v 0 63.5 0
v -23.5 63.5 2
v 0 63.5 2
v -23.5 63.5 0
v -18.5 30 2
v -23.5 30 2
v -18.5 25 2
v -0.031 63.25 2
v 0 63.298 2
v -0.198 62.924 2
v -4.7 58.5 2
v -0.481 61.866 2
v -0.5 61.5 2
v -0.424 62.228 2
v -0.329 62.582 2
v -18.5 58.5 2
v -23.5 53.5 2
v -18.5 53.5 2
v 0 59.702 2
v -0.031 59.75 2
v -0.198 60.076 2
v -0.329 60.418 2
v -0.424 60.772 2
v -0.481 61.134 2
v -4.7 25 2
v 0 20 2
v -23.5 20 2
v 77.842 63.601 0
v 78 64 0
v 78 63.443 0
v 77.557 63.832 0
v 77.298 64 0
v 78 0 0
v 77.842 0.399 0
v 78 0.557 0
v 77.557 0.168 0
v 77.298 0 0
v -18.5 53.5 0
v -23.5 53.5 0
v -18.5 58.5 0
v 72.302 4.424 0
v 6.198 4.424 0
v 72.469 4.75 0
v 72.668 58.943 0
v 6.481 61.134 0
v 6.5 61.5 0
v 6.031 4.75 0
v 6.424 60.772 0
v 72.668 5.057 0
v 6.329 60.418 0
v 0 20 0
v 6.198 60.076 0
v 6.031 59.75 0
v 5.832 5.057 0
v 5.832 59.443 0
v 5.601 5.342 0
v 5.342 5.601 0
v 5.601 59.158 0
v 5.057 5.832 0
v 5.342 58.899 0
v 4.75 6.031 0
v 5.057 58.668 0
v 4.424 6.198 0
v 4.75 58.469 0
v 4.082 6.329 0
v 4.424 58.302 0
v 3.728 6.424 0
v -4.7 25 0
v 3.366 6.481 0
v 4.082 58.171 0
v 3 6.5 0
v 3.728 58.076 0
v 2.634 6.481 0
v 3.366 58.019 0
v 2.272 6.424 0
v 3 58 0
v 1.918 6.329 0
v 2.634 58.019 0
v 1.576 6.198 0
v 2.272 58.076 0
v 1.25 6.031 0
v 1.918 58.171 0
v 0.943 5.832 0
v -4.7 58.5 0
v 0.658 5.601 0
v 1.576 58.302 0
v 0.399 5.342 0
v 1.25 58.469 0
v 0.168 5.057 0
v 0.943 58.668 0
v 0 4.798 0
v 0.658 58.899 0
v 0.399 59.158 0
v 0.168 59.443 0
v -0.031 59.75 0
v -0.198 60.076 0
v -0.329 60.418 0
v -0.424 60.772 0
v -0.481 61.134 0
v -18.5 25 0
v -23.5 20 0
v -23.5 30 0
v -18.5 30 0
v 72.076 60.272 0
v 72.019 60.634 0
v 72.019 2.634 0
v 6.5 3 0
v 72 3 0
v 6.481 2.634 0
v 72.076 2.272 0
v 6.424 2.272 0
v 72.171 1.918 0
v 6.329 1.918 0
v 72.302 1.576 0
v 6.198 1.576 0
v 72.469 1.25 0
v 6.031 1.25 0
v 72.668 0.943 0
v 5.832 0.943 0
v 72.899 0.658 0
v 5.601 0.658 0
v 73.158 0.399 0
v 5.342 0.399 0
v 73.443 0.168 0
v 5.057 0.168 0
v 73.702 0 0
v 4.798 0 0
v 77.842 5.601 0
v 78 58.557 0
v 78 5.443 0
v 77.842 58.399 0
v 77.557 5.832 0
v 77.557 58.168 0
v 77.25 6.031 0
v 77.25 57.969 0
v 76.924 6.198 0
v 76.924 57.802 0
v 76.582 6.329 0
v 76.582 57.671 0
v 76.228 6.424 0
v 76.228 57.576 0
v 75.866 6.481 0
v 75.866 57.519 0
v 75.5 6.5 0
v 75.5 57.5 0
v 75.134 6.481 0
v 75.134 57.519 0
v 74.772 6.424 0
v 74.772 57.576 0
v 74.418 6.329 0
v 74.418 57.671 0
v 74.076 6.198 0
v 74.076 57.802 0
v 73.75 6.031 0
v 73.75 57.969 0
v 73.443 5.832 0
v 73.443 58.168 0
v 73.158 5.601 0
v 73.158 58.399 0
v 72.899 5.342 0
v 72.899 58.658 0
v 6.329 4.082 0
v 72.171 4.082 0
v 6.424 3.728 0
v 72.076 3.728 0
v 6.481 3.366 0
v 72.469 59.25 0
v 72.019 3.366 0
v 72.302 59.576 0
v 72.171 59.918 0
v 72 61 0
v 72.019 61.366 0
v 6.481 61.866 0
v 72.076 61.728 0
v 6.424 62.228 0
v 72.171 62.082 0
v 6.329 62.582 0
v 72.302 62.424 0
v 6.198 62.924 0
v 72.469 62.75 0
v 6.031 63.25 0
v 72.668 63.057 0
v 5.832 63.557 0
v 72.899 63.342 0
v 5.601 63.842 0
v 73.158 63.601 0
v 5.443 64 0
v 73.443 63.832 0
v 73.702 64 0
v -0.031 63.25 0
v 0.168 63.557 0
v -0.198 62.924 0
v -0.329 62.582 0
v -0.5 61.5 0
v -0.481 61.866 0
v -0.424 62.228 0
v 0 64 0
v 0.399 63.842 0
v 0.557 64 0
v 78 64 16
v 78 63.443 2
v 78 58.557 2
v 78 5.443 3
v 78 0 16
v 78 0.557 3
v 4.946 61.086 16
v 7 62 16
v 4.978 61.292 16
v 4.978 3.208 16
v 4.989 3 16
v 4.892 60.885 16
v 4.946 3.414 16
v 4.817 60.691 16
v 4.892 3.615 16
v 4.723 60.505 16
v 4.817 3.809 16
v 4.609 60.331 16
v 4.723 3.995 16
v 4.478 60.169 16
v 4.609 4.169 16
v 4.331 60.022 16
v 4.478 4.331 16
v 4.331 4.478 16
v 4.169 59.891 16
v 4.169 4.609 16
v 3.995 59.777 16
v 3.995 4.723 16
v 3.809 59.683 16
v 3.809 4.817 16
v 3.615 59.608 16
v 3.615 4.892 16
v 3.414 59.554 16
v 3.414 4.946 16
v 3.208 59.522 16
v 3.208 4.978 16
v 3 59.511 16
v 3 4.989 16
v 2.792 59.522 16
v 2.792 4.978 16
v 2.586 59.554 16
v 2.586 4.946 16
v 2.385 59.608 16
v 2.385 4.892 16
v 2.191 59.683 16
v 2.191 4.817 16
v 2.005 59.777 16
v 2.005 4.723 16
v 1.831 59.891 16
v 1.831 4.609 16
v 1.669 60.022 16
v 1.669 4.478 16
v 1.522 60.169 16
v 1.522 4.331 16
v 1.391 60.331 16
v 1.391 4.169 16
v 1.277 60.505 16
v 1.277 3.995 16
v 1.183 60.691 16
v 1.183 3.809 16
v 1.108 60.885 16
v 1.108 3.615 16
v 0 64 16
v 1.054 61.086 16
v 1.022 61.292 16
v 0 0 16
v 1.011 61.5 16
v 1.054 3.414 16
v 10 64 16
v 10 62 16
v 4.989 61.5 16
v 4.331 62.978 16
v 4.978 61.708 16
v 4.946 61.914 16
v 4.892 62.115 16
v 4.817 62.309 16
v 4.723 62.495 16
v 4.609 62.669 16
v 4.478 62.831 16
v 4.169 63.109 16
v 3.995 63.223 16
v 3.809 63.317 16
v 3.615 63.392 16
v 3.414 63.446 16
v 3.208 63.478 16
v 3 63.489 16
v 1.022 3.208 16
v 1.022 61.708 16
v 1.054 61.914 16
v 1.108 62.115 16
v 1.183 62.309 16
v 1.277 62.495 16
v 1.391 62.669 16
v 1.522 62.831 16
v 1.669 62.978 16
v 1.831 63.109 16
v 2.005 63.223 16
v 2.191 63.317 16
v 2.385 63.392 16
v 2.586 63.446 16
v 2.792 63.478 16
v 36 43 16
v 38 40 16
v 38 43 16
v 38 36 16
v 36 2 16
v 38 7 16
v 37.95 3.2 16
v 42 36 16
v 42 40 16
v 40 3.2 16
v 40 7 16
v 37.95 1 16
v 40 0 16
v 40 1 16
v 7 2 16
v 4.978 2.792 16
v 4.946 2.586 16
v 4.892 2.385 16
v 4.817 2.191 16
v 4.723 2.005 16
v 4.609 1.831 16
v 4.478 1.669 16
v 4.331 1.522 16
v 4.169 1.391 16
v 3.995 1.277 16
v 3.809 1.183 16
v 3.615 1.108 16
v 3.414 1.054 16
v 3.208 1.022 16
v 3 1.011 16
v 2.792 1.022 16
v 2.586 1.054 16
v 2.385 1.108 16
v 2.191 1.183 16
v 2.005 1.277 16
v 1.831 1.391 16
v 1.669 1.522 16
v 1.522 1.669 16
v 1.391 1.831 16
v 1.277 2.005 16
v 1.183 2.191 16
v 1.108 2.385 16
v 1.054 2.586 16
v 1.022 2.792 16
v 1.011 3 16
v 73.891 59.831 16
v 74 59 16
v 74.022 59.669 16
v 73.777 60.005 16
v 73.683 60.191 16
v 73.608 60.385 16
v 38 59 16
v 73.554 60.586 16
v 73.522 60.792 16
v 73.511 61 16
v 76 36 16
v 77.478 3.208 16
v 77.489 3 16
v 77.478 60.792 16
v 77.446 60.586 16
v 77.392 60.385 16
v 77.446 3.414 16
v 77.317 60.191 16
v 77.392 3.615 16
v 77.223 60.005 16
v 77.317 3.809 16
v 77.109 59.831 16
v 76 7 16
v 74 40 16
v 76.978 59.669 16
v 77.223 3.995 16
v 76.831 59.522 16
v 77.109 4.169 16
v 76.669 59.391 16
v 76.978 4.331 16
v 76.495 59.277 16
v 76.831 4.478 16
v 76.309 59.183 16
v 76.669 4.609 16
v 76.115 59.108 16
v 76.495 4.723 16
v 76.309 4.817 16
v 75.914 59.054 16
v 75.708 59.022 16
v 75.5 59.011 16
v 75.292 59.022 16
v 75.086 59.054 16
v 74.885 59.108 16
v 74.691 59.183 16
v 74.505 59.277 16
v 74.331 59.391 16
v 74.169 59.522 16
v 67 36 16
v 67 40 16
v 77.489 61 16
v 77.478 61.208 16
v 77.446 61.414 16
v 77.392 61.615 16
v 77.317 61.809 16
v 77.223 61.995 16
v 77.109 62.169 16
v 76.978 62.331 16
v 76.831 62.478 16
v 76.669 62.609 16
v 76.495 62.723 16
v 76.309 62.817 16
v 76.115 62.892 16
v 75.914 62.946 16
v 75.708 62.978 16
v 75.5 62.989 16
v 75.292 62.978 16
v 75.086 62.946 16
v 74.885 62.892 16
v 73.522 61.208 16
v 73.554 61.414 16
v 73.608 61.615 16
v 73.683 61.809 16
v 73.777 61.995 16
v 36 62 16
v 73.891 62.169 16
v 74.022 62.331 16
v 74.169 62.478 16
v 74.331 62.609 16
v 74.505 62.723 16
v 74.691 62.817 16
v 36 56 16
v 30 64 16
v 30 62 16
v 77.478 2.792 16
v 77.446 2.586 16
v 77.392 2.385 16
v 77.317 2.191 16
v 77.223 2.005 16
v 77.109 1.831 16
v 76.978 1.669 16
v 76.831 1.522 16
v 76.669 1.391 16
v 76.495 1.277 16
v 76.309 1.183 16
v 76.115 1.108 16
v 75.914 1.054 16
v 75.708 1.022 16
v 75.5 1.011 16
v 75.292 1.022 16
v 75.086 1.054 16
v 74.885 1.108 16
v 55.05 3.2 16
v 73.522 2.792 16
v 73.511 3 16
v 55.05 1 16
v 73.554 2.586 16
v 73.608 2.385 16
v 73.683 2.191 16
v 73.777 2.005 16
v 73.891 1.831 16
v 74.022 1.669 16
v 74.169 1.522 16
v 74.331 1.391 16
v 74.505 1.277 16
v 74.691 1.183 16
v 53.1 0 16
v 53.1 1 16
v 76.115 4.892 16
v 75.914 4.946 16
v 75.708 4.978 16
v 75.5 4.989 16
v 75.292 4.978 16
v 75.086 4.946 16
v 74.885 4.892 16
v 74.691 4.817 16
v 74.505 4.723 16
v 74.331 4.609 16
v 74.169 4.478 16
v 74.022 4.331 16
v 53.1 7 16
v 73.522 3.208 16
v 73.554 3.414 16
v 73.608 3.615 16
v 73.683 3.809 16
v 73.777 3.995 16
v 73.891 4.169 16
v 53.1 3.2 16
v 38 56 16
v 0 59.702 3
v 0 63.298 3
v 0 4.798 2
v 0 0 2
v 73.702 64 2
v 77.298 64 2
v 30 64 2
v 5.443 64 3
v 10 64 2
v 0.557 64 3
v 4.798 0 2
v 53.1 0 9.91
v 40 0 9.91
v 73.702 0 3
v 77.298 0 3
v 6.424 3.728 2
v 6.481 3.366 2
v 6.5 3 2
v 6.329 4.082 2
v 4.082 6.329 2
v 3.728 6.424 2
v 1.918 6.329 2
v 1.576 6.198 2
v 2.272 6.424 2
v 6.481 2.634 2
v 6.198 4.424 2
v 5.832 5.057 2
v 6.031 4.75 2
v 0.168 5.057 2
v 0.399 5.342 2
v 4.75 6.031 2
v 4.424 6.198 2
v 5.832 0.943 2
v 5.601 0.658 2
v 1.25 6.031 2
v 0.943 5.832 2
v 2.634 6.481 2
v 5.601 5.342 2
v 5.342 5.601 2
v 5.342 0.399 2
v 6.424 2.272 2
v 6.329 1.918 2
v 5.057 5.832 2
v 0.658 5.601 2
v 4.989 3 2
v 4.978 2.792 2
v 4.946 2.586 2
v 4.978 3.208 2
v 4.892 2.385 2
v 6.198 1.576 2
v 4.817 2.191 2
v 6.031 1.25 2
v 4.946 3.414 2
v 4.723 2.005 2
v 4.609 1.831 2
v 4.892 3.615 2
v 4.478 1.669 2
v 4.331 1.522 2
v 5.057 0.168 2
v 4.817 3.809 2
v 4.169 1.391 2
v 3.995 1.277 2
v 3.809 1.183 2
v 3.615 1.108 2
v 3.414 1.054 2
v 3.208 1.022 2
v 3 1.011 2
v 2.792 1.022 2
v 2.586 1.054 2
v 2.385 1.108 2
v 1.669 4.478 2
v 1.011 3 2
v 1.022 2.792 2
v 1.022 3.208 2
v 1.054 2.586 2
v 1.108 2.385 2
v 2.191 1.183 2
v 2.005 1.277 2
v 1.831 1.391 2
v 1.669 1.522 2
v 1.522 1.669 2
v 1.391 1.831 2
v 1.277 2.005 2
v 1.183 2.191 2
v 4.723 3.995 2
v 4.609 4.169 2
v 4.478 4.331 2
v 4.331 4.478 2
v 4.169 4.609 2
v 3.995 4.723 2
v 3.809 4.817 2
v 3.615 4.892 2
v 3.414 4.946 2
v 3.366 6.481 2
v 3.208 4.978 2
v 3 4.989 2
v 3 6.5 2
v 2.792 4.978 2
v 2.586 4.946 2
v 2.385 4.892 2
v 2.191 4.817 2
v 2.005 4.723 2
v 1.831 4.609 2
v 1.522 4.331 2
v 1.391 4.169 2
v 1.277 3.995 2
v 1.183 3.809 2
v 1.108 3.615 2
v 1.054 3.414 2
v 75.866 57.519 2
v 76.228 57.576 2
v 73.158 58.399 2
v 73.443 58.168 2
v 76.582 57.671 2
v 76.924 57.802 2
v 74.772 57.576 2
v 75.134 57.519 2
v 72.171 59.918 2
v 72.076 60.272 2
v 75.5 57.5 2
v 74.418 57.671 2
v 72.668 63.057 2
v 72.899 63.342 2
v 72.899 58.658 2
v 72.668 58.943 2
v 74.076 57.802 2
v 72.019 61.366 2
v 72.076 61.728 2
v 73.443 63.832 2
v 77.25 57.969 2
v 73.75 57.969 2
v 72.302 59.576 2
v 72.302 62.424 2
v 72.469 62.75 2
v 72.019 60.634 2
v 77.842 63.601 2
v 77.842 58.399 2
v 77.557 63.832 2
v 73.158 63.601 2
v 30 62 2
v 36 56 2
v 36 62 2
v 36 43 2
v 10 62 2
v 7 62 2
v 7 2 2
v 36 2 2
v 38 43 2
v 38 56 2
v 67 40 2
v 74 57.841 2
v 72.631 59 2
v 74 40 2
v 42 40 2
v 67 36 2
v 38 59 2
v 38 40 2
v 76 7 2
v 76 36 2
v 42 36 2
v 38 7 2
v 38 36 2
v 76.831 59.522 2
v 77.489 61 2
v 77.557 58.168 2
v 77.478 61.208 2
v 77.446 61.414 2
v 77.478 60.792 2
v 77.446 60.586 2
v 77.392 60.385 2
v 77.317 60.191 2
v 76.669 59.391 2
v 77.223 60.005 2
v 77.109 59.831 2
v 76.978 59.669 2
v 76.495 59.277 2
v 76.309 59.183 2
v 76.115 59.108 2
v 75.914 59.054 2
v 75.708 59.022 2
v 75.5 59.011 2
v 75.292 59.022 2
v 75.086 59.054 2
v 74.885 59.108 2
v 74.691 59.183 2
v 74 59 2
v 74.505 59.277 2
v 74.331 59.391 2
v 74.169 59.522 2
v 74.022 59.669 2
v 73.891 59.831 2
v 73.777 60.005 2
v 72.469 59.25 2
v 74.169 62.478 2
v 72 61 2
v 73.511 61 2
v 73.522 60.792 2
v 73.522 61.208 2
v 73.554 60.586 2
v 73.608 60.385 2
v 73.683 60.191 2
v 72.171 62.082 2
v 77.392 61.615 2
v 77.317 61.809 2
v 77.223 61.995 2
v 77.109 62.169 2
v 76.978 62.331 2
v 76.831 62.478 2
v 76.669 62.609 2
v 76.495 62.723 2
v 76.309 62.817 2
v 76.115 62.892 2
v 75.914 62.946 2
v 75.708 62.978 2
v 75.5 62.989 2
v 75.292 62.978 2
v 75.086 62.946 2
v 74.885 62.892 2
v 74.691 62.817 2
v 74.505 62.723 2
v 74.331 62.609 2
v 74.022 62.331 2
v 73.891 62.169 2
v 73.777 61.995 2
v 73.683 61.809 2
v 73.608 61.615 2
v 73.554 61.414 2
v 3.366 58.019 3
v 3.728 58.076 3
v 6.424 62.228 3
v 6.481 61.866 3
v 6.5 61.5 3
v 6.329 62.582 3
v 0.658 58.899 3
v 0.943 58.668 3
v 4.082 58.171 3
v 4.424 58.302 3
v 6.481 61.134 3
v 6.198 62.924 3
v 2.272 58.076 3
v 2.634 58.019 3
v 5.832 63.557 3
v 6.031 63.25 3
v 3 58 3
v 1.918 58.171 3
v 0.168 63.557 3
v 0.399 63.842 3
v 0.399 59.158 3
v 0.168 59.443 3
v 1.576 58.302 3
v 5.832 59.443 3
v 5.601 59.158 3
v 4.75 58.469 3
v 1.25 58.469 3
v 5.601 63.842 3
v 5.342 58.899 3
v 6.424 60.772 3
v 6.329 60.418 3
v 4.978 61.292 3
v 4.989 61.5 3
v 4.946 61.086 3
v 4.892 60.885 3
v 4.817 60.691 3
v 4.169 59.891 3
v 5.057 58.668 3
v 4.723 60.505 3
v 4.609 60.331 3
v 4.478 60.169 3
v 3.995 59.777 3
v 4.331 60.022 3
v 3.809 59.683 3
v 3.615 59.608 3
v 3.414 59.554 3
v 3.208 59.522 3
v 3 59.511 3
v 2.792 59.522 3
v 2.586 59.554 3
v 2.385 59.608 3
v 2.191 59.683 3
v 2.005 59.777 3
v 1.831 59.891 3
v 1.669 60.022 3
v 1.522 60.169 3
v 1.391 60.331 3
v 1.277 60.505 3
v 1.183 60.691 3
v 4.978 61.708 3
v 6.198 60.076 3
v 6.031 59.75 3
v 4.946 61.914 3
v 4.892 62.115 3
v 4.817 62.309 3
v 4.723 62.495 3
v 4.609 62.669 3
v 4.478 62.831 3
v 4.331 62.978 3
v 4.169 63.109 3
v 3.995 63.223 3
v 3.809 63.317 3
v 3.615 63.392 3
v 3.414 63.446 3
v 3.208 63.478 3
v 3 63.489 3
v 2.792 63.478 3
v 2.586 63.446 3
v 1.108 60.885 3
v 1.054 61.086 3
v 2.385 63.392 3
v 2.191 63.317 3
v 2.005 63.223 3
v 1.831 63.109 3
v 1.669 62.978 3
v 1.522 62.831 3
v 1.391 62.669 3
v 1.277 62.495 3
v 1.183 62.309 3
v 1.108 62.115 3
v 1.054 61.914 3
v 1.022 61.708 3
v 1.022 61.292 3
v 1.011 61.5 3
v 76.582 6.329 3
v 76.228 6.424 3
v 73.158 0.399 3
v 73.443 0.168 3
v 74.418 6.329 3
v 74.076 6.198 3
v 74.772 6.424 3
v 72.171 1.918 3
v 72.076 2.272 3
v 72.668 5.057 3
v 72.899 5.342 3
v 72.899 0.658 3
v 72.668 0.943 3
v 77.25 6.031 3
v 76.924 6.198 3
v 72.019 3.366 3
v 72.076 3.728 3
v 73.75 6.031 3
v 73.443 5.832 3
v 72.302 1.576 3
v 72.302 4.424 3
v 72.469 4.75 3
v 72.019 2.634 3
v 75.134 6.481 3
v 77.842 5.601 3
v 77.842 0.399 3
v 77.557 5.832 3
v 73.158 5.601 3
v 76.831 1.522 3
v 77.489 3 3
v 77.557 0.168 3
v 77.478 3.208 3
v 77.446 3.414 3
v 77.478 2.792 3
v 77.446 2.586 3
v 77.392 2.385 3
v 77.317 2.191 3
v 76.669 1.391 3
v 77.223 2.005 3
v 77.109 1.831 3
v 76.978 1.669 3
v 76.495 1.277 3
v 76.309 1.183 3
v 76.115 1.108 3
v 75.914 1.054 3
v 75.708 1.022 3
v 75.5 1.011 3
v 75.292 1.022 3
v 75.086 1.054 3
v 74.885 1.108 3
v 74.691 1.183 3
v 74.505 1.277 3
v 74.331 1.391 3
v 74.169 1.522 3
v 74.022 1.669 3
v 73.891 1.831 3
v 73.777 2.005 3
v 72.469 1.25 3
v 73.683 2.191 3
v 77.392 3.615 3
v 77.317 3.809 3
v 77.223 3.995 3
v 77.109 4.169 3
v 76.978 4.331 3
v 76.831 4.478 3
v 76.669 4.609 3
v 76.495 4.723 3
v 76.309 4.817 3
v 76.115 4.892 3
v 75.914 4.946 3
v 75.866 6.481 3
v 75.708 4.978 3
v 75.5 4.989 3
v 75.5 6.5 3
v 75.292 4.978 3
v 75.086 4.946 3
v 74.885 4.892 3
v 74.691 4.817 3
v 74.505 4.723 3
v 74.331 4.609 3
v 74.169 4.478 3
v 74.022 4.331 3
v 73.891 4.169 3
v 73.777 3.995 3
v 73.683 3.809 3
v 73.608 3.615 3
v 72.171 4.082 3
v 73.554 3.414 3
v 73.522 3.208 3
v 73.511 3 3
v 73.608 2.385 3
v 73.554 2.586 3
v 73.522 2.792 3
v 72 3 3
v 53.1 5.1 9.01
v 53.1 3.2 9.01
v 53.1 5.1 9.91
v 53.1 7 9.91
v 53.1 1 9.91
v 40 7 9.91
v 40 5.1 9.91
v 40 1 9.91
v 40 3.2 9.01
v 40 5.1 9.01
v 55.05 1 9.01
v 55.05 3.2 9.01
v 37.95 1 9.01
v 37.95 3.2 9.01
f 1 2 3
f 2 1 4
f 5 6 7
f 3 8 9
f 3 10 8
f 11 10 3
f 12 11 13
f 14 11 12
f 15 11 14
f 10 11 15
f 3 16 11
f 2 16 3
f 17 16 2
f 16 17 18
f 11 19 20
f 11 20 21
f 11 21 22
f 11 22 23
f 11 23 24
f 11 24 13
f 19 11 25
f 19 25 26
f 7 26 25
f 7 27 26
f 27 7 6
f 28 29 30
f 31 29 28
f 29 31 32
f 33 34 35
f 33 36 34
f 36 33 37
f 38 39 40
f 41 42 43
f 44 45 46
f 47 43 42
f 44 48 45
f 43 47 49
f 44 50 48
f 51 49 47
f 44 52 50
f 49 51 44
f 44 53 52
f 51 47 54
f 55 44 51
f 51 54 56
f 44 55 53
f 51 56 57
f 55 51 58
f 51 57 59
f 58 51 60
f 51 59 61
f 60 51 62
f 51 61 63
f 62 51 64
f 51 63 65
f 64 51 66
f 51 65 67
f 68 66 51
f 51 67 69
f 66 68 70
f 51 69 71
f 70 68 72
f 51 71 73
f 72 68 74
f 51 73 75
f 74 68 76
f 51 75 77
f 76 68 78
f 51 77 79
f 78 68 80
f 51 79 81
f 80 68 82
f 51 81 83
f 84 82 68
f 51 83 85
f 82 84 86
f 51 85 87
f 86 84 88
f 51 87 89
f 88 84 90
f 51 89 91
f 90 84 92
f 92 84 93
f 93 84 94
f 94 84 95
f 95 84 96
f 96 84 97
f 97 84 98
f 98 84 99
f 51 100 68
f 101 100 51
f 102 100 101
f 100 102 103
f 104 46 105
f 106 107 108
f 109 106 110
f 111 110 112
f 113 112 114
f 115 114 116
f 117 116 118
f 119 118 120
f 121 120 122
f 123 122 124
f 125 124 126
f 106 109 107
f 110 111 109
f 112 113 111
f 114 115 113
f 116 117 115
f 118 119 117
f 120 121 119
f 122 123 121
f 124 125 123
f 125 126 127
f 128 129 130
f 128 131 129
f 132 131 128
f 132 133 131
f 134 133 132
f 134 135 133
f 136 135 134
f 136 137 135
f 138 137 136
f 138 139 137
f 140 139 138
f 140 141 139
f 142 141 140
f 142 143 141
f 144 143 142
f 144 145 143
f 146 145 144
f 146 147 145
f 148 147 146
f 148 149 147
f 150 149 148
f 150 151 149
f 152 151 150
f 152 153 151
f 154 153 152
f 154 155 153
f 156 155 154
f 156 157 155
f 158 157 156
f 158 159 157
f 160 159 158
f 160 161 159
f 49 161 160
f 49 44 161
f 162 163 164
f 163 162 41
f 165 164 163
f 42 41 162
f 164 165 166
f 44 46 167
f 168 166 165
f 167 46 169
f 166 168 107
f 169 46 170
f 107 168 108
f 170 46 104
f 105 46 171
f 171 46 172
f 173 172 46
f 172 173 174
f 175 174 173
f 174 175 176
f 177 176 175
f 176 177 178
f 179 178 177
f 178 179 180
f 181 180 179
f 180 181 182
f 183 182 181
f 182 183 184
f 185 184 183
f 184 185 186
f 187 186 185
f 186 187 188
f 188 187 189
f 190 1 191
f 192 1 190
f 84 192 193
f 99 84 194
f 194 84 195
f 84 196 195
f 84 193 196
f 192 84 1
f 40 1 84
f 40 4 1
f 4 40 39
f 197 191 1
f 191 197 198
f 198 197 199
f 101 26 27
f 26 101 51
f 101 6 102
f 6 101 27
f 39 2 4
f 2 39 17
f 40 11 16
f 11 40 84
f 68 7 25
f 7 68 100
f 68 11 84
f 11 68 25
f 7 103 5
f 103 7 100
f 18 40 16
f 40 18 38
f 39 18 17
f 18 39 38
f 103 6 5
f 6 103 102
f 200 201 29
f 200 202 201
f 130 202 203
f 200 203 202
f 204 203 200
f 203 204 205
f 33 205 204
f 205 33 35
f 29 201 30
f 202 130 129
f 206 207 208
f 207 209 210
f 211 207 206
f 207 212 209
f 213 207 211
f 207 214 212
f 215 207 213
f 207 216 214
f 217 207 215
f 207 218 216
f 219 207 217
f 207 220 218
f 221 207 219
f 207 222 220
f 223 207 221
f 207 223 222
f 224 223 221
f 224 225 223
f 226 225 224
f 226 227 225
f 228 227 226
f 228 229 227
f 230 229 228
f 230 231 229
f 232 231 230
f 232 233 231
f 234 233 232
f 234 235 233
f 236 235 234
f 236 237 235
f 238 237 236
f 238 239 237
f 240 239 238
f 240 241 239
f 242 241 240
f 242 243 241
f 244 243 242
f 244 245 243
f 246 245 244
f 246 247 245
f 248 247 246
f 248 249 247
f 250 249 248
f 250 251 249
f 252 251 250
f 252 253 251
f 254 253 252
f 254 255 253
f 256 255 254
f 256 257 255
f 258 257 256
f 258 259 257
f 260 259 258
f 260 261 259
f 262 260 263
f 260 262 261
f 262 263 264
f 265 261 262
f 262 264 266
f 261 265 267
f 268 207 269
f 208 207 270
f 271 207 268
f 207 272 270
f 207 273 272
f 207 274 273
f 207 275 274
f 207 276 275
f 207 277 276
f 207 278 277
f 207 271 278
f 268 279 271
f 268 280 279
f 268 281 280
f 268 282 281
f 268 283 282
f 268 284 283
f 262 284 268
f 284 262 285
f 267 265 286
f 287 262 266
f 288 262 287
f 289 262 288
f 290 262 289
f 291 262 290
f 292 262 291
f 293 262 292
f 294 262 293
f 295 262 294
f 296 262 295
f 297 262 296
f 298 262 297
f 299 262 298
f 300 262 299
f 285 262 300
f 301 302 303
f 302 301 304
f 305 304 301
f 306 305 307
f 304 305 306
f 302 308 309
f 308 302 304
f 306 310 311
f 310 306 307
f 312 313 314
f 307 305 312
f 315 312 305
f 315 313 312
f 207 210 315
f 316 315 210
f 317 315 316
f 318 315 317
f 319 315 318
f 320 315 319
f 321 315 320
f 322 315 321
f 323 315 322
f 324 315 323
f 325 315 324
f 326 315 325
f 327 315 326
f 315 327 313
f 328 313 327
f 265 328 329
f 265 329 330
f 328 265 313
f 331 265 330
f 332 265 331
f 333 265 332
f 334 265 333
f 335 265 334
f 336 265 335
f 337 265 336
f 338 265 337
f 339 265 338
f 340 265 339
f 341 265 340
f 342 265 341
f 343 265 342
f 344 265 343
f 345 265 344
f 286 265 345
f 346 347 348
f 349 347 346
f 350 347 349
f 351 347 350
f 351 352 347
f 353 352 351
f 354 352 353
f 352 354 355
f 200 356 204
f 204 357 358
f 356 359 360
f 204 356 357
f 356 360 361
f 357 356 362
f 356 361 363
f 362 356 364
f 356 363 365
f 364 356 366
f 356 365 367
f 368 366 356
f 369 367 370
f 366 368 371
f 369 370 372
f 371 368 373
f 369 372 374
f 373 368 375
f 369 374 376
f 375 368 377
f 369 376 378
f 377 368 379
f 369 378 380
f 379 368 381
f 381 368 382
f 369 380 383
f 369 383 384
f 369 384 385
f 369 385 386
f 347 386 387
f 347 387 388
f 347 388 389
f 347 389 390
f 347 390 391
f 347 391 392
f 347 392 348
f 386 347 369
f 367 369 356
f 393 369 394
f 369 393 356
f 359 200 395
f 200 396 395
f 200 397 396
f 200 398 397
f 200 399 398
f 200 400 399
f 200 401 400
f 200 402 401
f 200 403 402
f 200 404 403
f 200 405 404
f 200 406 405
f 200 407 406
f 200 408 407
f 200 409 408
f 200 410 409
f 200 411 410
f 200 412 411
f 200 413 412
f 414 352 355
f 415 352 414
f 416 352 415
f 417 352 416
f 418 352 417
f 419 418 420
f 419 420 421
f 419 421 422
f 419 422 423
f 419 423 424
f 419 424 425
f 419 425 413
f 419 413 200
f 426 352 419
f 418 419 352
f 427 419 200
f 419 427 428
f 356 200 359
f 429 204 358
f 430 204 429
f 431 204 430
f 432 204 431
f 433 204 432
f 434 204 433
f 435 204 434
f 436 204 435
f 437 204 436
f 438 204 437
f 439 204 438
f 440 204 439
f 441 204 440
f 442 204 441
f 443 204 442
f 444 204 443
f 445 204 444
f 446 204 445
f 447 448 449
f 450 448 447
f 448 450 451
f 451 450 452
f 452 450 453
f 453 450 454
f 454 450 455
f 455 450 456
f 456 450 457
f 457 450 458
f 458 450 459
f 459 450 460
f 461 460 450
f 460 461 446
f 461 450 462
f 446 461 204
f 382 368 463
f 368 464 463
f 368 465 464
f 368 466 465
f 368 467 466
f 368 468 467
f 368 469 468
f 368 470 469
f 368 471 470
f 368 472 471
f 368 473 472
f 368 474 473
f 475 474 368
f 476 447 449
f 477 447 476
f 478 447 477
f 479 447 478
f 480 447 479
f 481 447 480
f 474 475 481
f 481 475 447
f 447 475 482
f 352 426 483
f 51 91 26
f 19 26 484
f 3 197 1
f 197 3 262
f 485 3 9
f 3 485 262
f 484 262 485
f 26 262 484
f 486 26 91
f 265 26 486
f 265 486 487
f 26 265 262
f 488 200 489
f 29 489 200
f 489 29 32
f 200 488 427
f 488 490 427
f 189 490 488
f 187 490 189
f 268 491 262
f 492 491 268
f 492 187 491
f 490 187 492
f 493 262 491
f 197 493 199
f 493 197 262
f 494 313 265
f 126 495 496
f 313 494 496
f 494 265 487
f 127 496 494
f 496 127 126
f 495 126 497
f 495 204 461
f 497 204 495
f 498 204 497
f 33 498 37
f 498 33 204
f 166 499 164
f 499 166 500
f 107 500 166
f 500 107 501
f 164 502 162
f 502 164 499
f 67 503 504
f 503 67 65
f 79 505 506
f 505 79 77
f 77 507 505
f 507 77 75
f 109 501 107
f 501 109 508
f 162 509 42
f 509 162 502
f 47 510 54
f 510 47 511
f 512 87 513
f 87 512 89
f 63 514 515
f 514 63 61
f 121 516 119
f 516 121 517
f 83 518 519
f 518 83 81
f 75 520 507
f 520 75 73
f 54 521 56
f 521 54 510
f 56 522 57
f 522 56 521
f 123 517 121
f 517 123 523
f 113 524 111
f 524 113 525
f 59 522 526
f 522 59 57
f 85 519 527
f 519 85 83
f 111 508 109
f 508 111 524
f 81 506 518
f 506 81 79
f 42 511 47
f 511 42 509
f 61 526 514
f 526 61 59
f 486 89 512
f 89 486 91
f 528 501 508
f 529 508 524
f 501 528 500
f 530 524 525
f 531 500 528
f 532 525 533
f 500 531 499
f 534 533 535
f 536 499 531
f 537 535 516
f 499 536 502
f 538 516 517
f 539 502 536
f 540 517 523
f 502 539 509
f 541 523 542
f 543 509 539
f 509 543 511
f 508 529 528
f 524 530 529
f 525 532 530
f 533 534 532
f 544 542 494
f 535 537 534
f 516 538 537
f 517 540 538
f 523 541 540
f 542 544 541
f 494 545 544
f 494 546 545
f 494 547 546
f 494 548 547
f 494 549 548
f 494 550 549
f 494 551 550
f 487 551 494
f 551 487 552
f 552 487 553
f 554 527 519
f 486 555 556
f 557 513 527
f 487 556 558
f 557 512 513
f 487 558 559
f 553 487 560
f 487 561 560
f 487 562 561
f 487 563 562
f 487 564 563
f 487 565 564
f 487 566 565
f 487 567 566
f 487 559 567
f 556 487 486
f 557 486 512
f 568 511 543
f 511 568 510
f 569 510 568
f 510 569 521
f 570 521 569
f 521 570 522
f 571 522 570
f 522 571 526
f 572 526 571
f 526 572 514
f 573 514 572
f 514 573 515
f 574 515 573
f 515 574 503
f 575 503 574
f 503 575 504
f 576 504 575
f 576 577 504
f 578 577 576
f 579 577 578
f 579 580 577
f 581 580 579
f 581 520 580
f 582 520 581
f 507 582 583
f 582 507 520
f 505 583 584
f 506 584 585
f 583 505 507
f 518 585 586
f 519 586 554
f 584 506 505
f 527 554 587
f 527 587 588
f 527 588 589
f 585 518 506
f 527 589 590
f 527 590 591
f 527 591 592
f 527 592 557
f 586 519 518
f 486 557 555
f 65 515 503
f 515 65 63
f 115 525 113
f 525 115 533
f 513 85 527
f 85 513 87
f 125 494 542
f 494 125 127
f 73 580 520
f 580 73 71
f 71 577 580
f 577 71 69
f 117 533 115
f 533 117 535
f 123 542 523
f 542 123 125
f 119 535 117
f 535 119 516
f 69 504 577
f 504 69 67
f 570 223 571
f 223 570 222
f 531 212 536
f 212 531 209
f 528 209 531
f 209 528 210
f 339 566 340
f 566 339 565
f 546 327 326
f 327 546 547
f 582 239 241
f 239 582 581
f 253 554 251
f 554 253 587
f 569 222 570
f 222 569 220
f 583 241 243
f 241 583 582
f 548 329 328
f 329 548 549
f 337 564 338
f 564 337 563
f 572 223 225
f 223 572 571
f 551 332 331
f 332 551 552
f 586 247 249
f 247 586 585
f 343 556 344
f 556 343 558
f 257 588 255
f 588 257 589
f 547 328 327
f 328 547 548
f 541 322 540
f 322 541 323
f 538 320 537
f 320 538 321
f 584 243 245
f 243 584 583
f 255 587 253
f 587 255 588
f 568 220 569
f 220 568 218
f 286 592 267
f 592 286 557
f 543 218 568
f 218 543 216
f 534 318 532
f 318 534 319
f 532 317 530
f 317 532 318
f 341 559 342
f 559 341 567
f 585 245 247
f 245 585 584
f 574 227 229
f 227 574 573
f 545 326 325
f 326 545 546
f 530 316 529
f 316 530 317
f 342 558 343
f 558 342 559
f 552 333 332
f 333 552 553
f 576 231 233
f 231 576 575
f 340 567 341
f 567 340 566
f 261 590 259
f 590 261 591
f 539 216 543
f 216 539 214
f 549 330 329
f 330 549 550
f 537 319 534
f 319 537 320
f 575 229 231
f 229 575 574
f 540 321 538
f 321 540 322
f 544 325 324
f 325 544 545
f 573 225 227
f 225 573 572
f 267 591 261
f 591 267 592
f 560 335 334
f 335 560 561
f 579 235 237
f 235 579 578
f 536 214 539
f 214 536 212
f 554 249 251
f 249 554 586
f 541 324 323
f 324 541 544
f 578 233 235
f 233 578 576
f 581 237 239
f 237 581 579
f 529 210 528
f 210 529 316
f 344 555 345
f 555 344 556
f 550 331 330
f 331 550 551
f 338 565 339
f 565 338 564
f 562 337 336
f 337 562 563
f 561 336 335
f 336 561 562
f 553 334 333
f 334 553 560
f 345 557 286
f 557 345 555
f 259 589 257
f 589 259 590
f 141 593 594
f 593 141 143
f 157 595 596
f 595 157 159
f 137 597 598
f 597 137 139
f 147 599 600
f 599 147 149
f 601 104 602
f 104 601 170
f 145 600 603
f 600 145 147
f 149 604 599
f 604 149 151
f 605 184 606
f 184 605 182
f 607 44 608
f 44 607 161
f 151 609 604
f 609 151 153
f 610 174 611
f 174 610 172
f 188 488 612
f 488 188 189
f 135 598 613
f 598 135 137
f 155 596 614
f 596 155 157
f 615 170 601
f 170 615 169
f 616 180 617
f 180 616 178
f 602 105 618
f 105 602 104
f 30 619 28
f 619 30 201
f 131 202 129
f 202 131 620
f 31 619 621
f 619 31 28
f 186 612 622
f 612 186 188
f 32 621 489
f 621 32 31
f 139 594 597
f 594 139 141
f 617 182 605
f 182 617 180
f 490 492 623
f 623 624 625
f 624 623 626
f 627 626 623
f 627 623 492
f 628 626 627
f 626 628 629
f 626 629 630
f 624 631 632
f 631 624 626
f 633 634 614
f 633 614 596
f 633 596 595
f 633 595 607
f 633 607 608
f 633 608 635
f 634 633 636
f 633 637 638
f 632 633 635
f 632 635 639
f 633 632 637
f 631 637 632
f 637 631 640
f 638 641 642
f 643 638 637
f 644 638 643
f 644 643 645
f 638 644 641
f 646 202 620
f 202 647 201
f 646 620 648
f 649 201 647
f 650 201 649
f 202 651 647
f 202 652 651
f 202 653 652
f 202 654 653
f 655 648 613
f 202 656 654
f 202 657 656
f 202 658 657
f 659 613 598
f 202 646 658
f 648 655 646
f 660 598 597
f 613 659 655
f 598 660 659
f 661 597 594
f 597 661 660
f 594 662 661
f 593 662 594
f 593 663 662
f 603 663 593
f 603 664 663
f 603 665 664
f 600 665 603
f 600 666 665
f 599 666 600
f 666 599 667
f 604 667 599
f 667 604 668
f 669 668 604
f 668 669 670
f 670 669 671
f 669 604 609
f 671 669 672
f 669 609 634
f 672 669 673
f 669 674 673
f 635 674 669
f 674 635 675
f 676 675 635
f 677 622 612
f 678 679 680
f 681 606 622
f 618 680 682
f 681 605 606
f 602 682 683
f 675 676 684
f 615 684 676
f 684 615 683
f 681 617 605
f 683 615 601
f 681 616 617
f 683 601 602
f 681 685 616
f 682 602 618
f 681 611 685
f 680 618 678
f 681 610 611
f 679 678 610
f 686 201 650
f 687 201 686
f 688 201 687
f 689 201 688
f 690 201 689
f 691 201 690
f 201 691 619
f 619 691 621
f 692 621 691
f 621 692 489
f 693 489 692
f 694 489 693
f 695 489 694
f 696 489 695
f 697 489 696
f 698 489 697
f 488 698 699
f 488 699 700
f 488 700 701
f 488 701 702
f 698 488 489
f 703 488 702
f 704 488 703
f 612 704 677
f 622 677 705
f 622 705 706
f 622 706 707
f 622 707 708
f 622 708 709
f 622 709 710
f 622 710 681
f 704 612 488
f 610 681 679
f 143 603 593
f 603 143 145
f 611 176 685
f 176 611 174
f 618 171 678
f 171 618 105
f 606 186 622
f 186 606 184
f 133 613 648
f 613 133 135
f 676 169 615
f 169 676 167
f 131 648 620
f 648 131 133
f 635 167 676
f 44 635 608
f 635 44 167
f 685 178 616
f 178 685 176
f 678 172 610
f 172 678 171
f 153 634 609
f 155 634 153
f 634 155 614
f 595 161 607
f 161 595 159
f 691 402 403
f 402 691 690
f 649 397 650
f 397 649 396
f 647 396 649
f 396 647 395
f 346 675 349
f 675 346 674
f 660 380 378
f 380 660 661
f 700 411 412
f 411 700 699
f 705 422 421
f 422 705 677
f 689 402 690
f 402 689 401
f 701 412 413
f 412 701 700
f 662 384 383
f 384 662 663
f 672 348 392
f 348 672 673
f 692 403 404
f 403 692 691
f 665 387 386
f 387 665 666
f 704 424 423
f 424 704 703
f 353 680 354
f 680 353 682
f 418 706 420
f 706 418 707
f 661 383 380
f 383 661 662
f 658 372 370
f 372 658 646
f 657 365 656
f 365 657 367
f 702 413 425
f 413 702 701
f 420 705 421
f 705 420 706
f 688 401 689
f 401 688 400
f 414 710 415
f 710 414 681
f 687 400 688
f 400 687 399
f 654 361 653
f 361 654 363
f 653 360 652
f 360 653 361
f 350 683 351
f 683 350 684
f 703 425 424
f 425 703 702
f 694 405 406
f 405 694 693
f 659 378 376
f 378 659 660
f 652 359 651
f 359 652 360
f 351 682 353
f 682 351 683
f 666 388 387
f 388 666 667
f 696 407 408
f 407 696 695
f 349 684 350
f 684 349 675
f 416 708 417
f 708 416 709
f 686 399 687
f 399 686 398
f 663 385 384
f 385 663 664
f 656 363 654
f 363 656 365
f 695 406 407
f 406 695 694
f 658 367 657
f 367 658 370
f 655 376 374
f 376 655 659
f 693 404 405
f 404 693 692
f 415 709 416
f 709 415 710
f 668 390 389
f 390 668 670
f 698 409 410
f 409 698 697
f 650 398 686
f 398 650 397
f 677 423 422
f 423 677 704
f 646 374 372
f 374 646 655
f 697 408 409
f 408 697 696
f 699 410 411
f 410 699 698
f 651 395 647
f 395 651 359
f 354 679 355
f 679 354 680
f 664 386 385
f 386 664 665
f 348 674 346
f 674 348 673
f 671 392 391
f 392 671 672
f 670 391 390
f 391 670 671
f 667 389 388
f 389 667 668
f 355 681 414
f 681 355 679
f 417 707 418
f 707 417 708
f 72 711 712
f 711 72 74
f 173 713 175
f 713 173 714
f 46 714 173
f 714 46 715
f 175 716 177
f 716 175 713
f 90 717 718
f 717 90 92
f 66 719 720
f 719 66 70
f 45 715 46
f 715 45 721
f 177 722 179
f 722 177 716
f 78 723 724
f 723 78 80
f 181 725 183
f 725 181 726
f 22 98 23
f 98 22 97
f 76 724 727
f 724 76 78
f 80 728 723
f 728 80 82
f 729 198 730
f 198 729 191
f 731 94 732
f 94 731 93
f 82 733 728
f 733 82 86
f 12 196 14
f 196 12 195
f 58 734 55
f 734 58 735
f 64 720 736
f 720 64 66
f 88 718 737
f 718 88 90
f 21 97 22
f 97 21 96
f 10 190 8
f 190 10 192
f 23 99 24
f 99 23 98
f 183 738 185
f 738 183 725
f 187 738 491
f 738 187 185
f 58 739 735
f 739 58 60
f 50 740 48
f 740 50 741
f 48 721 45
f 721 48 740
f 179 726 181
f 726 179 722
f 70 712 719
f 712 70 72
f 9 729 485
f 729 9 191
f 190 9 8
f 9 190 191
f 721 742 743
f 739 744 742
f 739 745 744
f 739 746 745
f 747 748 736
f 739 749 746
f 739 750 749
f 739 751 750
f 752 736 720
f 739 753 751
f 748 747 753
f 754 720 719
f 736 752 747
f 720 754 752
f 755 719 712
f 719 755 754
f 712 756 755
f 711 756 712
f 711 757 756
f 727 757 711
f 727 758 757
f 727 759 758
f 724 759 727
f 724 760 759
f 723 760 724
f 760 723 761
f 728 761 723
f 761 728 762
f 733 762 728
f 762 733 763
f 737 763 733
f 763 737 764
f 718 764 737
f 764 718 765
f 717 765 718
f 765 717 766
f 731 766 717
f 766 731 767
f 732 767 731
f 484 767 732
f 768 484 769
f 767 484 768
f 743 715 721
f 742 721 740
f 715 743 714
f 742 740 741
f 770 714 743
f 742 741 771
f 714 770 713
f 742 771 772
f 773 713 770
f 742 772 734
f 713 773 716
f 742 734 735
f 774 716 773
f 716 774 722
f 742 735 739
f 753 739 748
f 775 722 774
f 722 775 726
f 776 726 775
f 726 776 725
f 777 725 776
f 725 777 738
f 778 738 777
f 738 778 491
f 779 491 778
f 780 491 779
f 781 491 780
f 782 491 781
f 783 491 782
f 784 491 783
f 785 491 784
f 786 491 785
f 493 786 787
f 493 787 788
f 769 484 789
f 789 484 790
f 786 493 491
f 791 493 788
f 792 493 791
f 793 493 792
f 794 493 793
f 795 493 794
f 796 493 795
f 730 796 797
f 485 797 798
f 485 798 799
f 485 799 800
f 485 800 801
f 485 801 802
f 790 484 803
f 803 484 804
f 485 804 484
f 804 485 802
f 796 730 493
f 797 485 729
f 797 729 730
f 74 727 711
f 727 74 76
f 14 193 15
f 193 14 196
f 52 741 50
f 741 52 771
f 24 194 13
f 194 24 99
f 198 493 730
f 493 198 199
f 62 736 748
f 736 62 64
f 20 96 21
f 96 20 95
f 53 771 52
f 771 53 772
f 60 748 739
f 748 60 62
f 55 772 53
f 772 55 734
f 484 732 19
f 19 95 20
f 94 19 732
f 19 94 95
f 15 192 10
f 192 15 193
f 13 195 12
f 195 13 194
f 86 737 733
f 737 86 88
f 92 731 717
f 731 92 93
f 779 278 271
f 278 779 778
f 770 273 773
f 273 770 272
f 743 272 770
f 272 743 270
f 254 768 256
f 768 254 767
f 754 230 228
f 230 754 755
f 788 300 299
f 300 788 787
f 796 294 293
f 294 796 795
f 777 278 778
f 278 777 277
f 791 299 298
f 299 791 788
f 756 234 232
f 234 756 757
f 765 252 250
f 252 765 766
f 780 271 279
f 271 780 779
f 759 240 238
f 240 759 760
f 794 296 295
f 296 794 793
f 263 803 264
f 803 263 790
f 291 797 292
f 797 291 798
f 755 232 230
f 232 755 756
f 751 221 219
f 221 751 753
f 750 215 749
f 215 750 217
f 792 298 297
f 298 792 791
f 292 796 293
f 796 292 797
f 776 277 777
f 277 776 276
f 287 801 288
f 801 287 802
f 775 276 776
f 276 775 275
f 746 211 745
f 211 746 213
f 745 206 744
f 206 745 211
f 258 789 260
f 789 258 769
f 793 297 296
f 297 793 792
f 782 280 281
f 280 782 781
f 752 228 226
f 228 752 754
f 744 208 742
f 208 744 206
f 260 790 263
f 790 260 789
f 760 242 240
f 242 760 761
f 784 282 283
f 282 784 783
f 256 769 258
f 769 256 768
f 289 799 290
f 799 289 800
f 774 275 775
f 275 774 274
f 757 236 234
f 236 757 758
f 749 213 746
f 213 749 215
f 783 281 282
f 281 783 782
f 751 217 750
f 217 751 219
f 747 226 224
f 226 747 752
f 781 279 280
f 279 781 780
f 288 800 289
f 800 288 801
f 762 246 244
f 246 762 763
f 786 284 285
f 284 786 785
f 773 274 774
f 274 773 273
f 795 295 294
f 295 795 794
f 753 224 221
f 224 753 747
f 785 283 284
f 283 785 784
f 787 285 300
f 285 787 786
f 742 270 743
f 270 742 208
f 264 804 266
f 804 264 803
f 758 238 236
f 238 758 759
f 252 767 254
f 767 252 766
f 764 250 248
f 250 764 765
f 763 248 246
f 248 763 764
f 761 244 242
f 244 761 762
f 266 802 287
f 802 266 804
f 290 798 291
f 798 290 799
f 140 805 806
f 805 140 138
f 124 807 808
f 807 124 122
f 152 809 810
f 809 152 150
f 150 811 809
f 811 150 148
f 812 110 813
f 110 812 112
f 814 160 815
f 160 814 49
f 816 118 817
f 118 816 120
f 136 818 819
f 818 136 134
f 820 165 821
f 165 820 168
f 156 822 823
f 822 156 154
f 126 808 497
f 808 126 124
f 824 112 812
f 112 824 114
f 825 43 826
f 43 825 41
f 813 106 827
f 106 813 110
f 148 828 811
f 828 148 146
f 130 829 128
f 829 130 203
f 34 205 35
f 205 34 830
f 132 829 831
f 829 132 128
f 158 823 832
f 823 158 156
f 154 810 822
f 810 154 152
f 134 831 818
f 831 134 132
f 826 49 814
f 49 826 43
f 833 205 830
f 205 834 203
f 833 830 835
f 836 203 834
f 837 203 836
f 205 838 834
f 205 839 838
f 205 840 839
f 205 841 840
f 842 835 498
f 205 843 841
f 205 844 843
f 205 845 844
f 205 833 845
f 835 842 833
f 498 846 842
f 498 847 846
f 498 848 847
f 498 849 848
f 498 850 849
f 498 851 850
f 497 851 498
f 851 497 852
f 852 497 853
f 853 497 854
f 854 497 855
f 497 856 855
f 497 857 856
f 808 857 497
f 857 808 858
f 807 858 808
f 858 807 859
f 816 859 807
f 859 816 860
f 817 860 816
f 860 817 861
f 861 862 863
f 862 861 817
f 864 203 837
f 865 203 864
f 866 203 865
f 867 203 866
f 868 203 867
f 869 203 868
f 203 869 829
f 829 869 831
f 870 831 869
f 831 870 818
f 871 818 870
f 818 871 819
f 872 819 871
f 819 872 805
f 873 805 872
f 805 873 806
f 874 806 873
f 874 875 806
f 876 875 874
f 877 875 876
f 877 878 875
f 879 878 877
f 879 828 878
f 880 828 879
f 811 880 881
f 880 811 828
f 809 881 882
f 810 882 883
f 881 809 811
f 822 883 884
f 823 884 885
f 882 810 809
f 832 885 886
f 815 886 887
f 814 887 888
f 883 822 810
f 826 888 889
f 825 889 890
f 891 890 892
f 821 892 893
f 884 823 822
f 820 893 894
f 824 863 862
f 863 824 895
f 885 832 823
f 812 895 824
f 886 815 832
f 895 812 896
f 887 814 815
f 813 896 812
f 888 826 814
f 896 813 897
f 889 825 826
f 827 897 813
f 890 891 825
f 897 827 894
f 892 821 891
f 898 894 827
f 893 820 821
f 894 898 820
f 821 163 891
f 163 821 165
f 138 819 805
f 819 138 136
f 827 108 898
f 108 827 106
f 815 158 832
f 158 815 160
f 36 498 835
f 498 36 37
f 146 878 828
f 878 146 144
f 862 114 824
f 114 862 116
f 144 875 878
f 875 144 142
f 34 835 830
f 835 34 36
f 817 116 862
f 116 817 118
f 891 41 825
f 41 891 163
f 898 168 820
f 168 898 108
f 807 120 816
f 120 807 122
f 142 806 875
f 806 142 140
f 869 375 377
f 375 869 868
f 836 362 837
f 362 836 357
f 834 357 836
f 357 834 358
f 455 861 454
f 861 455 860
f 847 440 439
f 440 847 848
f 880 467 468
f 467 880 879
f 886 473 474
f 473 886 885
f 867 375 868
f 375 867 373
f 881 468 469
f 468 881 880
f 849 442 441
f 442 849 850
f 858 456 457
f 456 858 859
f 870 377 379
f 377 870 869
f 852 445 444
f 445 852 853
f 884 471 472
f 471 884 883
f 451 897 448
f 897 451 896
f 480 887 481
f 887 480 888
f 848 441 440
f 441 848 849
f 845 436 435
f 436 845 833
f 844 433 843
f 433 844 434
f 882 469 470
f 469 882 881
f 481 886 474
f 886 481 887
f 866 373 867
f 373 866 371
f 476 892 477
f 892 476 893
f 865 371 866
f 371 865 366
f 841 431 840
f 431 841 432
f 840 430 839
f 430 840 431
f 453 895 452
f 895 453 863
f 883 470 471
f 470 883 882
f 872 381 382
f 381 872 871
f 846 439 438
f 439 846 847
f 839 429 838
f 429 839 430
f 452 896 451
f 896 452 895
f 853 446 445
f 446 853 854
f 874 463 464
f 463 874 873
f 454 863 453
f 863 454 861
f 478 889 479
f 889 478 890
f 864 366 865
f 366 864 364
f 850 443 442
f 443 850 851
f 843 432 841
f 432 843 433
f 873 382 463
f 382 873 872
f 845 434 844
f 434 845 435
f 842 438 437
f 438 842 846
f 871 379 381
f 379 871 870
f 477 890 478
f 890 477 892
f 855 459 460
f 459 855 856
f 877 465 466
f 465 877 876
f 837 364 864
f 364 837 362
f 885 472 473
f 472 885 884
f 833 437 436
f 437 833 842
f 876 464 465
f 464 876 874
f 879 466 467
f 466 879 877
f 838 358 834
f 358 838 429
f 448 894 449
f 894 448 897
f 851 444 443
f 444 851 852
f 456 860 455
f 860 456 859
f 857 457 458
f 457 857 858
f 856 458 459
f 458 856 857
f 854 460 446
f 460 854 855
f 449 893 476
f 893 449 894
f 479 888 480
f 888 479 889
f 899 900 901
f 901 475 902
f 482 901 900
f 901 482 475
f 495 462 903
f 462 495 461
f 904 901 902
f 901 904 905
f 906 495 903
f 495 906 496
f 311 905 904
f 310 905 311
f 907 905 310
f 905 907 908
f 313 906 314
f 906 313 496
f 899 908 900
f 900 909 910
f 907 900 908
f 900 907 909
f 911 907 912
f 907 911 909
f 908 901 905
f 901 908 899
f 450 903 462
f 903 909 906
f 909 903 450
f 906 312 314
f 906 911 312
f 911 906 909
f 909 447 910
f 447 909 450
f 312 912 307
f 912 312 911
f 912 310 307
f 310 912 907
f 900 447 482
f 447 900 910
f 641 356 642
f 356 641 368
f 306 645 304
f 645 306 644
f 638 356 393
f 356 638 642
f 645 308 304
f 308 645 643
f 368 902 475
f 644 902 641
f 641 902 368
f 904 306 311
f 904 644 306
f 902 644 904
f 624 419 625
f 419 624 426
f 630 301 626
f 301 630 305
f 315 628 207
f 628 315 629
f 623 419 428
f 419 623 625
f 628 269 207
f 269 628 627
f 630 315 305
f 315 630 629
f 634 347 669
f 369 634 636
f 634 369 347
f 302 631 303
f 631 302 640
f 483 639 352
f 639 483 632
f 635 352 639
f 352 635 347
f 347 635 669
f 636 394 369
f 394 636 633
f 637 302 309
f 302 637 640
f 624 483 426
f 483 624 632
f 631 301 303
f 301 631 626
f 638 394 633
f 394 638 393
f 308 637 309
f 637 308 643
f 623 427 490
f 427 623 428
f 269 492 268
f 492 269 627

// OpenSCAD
include <MCAD/nuts_and_bolts.scad>
$fn = 60;

module main()
{
	difference()
	{
		//translate([0,0,16])cube([78,64,2]);
		union(){
		cube([78,64,16]);
	translate([-23.5,20,0])mirror([-1,1,0])obdholder();
		}
		translate([38,7,2])power();
		translate([7,2,2])cube([29,60,23.1]);
		translate([38,40,2])cube([36,19,25.01]);
		translate([32,43,2])cube([10,13,25]);
		translate([42,33,2])cube([25,10,25]);
		translate([10,55,2])cube([20,10,25]);
	#cube([2,2,2]);
	#scale([1,1,2])translate([3,3,1])boltHole(4,length=20);
		scale([1,1,2])translate([75.5,61,1])boltHole(4,length=20);	
		scale([1,1,3])translate([3,61.5,1])boltHole(4,length=20);
		#scale([1,1,3])translate([75.5,3,1])boltHole(4,length=20);		
		translate([40,-5,16.01])mirror([0,0,1])USB();
	}
}
module USB()
{
	cube([13.1,14.1,6.1]);
	translate([0,6,0])cube([13.1,4.1,7]);
	translate([-2.05,6,0])cube([17.1,2.2,7]);
}
module power()
{
	cube([38,29,14.01]);
}

module obdholder()
{
	difference()
	{
		cube([43.5,23.8,2]);
		translate([5,5,-1])cube([33.5,13.8,4]);
		translate([10,-1,-1])cube([23.5,10,4]);
	}
}
module obd()
{
	difference()
	{
		cube([24.5,15,5.8]);
		translate([1,-1,2])cube([22,17,1.8]);
		translate([18,5,-7])rotate([0,0,0])cylinder(10,d=2.50);
	}
}
main();
